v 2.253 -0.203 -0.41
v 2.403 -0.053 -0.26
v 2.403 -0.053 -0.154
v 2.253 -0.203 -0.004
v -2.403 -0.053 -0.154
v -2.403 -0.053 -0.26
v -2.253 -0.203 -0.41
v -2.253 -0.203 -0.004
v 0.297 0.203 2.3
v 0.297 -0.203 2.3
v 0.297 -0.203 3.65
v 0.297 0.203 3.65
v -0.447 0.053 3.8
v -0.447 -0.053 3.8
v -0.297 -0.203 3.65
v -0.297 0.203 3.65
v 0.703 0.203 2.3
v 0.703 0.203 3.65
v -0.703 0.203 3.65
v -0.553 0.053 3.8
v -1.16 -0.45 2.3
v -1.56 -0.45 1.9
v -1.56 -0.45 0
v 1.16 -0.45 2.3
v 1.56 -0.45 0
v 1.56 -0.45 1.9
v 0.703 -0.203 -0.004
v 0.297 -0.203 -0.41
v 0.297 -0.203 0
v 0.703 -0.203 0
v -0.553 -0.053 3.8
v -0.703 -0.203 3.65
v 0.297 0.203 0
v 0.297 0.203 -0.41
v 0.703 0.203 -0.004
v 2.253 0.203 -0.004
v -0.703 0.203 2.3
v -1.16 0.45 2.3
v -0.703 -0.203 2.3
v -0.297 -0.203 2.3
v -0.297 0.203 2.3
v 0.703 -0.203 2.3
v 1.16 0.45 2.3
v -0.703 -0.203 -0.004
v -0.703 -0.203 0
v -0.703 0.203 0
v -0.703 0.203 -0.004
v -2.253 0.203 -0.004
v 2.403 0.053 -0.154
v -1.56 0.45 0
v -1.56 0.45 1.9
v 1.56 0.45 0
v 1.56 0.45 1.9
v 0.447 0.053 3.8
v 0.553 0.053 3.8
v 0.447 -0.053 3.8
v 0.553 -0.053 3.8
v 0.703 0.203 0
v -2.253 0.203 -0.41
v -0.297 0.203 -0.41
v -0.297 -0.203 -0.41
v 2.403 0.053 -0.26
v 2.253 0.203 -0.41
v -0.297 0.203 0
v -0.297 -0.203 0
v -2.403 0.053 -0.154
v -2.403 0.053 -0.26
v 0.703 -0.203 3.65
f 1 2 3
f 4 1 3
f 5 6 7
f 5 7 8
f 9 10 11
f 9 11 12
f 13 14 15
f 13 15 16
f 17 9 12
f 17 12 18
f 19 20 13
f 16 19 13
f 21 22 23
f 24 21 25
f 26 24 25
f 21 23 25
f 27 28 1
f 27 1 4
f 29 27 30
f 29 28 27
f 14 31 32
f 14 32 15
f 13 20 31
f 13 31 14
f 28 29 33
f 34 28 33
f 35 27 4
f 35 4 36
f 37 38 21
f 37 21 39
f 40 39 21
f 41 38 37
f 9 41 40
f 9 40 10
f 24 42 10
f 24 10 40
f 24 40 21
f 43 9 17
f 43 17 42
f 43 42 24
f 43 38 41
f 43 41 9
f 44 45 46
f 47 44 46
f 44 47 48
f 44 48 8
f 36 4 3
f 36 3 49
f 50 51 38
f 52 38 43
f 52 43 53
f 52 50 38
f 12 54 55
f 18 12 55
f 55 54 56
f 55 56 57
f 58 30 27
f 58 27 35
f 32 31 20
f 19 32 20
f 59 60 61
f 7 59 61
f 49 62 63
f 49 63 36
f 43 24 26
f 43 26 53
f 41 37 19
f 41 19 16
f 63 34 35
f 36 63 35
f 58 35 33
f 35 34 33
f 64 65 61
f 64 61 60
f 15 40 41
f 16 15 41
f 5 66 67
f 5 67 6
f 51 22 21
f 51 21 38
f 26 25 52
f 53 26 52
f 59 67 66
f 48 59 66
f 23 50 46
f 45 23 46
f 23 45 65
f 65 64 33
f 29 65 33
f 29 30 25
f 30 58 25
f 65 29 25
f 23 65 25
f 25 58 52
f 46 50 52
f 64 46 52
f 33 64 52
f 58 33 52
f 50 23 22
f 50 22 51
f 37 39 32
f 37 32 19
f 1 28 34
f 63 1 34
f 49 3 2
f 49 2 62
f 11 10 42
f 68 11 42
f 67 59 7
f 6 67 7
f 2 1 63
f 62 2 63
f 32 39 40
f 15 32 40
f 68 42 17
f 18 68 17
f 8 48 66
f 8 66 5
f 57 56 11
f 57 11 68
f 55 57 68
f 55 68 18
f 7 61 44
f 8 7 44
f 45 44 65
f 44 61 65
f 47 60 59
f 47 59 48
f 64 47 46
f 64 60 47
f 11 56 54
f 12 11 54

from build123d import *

# Parameters (mm, degrees)
F0_W          = 3.12
F0_H          = 0.9
F1_DEPTH      = 2.3
F2_W          = 0.406
F2_H          = 0.406
F3_DEPTH      = 1.5
F3_DEPTH_BACK = 2.71
F4_W          = 0.406
F4_H          = 0.406
F5_DEPTH      = 1.7
F6_W          = 0.406
F6_H          = 0.406
F7_DEPTH      = 1.7
F8_SIZE       = 0.4
F9_SIZE       = 0.15


with BuildPart() as f1:
    # F0 (on Top) → F1 (new body)
    with BuildSketch(Plane.XY):
        Rectangle(F0_W, F0_H)
    extrude(amount=F1_DEPTH)

    # F2 (on face) → F3 (join, two sides)
    with BuildSketch(Plane.XY.offset(2.3)) as f3_sk:
        with Locations((-0.5, 0)):
            Rectangle(F2_W, F2_H)
        with Locations((0.5, 0)):
            Rectangle(F2_W, F2_H)
    extrude(amount=F3_DEPTH)
    extrude(f3_sk.sketch, amount=-F3_DEPTH_BACK)

    # F4 (on face) → F5 (join)
    with BuildSketch(Plane.YZ.offset(0.703)):
        with Locations((0, -0.207)):
            Rectangle(F4_W, F4_H)
    extrude(amount=F5_DEPTH)

    # F6 (on face) → F7 (join)
    with BuildSketch(Plane(origin=(-0.703, 0, 0), x_dir=(0, -1, 0), z_dir=(-1, 0, 0))):
        with Locations((0, -0.207)):
            Rectangle(F6_W, F6_H)
    extrude(amount=F7_DEPTH)

    # F8
    f8_edges = [f1.edges().sort_by_distance(p)[0] for p in [
        (1.56, 0, 2.3),
        (-1.56, 0, 2.3),
    ]]
    chamfer(f8_edges, length=F8_SIZE)

    # F9
    f9_edges = [f1.edges().sort_by_distance(p)[0] for p in [
        (-0.5, 0.203, 3.8),
        (0.5, 0.203, 3.8),
        (0.703, 0, 3.8),
        (0.5, -0.203, 3.8),
        (0.297, 0, 3.8),
        (-0.297, 0, 3.8),
        (-0.5, -0.203, 3.8),
        (-0.703, 0, 3.8),
        (2.403, 0, -0.004),
        (2.403, -0.203, -0.207),
        (2.403, 0, -0.41),
        (2.403, 0.203, -0.207),
        (-2.403, 0, -0.004),
        (-2.403, -0.203, -0.207),
        (-2.403, 0, -0.41),
        (-2.403, 0.203, -0.207),
    ]]
    chamfer(f9_edges, length=F9_SIZE)


solid = f1.part
